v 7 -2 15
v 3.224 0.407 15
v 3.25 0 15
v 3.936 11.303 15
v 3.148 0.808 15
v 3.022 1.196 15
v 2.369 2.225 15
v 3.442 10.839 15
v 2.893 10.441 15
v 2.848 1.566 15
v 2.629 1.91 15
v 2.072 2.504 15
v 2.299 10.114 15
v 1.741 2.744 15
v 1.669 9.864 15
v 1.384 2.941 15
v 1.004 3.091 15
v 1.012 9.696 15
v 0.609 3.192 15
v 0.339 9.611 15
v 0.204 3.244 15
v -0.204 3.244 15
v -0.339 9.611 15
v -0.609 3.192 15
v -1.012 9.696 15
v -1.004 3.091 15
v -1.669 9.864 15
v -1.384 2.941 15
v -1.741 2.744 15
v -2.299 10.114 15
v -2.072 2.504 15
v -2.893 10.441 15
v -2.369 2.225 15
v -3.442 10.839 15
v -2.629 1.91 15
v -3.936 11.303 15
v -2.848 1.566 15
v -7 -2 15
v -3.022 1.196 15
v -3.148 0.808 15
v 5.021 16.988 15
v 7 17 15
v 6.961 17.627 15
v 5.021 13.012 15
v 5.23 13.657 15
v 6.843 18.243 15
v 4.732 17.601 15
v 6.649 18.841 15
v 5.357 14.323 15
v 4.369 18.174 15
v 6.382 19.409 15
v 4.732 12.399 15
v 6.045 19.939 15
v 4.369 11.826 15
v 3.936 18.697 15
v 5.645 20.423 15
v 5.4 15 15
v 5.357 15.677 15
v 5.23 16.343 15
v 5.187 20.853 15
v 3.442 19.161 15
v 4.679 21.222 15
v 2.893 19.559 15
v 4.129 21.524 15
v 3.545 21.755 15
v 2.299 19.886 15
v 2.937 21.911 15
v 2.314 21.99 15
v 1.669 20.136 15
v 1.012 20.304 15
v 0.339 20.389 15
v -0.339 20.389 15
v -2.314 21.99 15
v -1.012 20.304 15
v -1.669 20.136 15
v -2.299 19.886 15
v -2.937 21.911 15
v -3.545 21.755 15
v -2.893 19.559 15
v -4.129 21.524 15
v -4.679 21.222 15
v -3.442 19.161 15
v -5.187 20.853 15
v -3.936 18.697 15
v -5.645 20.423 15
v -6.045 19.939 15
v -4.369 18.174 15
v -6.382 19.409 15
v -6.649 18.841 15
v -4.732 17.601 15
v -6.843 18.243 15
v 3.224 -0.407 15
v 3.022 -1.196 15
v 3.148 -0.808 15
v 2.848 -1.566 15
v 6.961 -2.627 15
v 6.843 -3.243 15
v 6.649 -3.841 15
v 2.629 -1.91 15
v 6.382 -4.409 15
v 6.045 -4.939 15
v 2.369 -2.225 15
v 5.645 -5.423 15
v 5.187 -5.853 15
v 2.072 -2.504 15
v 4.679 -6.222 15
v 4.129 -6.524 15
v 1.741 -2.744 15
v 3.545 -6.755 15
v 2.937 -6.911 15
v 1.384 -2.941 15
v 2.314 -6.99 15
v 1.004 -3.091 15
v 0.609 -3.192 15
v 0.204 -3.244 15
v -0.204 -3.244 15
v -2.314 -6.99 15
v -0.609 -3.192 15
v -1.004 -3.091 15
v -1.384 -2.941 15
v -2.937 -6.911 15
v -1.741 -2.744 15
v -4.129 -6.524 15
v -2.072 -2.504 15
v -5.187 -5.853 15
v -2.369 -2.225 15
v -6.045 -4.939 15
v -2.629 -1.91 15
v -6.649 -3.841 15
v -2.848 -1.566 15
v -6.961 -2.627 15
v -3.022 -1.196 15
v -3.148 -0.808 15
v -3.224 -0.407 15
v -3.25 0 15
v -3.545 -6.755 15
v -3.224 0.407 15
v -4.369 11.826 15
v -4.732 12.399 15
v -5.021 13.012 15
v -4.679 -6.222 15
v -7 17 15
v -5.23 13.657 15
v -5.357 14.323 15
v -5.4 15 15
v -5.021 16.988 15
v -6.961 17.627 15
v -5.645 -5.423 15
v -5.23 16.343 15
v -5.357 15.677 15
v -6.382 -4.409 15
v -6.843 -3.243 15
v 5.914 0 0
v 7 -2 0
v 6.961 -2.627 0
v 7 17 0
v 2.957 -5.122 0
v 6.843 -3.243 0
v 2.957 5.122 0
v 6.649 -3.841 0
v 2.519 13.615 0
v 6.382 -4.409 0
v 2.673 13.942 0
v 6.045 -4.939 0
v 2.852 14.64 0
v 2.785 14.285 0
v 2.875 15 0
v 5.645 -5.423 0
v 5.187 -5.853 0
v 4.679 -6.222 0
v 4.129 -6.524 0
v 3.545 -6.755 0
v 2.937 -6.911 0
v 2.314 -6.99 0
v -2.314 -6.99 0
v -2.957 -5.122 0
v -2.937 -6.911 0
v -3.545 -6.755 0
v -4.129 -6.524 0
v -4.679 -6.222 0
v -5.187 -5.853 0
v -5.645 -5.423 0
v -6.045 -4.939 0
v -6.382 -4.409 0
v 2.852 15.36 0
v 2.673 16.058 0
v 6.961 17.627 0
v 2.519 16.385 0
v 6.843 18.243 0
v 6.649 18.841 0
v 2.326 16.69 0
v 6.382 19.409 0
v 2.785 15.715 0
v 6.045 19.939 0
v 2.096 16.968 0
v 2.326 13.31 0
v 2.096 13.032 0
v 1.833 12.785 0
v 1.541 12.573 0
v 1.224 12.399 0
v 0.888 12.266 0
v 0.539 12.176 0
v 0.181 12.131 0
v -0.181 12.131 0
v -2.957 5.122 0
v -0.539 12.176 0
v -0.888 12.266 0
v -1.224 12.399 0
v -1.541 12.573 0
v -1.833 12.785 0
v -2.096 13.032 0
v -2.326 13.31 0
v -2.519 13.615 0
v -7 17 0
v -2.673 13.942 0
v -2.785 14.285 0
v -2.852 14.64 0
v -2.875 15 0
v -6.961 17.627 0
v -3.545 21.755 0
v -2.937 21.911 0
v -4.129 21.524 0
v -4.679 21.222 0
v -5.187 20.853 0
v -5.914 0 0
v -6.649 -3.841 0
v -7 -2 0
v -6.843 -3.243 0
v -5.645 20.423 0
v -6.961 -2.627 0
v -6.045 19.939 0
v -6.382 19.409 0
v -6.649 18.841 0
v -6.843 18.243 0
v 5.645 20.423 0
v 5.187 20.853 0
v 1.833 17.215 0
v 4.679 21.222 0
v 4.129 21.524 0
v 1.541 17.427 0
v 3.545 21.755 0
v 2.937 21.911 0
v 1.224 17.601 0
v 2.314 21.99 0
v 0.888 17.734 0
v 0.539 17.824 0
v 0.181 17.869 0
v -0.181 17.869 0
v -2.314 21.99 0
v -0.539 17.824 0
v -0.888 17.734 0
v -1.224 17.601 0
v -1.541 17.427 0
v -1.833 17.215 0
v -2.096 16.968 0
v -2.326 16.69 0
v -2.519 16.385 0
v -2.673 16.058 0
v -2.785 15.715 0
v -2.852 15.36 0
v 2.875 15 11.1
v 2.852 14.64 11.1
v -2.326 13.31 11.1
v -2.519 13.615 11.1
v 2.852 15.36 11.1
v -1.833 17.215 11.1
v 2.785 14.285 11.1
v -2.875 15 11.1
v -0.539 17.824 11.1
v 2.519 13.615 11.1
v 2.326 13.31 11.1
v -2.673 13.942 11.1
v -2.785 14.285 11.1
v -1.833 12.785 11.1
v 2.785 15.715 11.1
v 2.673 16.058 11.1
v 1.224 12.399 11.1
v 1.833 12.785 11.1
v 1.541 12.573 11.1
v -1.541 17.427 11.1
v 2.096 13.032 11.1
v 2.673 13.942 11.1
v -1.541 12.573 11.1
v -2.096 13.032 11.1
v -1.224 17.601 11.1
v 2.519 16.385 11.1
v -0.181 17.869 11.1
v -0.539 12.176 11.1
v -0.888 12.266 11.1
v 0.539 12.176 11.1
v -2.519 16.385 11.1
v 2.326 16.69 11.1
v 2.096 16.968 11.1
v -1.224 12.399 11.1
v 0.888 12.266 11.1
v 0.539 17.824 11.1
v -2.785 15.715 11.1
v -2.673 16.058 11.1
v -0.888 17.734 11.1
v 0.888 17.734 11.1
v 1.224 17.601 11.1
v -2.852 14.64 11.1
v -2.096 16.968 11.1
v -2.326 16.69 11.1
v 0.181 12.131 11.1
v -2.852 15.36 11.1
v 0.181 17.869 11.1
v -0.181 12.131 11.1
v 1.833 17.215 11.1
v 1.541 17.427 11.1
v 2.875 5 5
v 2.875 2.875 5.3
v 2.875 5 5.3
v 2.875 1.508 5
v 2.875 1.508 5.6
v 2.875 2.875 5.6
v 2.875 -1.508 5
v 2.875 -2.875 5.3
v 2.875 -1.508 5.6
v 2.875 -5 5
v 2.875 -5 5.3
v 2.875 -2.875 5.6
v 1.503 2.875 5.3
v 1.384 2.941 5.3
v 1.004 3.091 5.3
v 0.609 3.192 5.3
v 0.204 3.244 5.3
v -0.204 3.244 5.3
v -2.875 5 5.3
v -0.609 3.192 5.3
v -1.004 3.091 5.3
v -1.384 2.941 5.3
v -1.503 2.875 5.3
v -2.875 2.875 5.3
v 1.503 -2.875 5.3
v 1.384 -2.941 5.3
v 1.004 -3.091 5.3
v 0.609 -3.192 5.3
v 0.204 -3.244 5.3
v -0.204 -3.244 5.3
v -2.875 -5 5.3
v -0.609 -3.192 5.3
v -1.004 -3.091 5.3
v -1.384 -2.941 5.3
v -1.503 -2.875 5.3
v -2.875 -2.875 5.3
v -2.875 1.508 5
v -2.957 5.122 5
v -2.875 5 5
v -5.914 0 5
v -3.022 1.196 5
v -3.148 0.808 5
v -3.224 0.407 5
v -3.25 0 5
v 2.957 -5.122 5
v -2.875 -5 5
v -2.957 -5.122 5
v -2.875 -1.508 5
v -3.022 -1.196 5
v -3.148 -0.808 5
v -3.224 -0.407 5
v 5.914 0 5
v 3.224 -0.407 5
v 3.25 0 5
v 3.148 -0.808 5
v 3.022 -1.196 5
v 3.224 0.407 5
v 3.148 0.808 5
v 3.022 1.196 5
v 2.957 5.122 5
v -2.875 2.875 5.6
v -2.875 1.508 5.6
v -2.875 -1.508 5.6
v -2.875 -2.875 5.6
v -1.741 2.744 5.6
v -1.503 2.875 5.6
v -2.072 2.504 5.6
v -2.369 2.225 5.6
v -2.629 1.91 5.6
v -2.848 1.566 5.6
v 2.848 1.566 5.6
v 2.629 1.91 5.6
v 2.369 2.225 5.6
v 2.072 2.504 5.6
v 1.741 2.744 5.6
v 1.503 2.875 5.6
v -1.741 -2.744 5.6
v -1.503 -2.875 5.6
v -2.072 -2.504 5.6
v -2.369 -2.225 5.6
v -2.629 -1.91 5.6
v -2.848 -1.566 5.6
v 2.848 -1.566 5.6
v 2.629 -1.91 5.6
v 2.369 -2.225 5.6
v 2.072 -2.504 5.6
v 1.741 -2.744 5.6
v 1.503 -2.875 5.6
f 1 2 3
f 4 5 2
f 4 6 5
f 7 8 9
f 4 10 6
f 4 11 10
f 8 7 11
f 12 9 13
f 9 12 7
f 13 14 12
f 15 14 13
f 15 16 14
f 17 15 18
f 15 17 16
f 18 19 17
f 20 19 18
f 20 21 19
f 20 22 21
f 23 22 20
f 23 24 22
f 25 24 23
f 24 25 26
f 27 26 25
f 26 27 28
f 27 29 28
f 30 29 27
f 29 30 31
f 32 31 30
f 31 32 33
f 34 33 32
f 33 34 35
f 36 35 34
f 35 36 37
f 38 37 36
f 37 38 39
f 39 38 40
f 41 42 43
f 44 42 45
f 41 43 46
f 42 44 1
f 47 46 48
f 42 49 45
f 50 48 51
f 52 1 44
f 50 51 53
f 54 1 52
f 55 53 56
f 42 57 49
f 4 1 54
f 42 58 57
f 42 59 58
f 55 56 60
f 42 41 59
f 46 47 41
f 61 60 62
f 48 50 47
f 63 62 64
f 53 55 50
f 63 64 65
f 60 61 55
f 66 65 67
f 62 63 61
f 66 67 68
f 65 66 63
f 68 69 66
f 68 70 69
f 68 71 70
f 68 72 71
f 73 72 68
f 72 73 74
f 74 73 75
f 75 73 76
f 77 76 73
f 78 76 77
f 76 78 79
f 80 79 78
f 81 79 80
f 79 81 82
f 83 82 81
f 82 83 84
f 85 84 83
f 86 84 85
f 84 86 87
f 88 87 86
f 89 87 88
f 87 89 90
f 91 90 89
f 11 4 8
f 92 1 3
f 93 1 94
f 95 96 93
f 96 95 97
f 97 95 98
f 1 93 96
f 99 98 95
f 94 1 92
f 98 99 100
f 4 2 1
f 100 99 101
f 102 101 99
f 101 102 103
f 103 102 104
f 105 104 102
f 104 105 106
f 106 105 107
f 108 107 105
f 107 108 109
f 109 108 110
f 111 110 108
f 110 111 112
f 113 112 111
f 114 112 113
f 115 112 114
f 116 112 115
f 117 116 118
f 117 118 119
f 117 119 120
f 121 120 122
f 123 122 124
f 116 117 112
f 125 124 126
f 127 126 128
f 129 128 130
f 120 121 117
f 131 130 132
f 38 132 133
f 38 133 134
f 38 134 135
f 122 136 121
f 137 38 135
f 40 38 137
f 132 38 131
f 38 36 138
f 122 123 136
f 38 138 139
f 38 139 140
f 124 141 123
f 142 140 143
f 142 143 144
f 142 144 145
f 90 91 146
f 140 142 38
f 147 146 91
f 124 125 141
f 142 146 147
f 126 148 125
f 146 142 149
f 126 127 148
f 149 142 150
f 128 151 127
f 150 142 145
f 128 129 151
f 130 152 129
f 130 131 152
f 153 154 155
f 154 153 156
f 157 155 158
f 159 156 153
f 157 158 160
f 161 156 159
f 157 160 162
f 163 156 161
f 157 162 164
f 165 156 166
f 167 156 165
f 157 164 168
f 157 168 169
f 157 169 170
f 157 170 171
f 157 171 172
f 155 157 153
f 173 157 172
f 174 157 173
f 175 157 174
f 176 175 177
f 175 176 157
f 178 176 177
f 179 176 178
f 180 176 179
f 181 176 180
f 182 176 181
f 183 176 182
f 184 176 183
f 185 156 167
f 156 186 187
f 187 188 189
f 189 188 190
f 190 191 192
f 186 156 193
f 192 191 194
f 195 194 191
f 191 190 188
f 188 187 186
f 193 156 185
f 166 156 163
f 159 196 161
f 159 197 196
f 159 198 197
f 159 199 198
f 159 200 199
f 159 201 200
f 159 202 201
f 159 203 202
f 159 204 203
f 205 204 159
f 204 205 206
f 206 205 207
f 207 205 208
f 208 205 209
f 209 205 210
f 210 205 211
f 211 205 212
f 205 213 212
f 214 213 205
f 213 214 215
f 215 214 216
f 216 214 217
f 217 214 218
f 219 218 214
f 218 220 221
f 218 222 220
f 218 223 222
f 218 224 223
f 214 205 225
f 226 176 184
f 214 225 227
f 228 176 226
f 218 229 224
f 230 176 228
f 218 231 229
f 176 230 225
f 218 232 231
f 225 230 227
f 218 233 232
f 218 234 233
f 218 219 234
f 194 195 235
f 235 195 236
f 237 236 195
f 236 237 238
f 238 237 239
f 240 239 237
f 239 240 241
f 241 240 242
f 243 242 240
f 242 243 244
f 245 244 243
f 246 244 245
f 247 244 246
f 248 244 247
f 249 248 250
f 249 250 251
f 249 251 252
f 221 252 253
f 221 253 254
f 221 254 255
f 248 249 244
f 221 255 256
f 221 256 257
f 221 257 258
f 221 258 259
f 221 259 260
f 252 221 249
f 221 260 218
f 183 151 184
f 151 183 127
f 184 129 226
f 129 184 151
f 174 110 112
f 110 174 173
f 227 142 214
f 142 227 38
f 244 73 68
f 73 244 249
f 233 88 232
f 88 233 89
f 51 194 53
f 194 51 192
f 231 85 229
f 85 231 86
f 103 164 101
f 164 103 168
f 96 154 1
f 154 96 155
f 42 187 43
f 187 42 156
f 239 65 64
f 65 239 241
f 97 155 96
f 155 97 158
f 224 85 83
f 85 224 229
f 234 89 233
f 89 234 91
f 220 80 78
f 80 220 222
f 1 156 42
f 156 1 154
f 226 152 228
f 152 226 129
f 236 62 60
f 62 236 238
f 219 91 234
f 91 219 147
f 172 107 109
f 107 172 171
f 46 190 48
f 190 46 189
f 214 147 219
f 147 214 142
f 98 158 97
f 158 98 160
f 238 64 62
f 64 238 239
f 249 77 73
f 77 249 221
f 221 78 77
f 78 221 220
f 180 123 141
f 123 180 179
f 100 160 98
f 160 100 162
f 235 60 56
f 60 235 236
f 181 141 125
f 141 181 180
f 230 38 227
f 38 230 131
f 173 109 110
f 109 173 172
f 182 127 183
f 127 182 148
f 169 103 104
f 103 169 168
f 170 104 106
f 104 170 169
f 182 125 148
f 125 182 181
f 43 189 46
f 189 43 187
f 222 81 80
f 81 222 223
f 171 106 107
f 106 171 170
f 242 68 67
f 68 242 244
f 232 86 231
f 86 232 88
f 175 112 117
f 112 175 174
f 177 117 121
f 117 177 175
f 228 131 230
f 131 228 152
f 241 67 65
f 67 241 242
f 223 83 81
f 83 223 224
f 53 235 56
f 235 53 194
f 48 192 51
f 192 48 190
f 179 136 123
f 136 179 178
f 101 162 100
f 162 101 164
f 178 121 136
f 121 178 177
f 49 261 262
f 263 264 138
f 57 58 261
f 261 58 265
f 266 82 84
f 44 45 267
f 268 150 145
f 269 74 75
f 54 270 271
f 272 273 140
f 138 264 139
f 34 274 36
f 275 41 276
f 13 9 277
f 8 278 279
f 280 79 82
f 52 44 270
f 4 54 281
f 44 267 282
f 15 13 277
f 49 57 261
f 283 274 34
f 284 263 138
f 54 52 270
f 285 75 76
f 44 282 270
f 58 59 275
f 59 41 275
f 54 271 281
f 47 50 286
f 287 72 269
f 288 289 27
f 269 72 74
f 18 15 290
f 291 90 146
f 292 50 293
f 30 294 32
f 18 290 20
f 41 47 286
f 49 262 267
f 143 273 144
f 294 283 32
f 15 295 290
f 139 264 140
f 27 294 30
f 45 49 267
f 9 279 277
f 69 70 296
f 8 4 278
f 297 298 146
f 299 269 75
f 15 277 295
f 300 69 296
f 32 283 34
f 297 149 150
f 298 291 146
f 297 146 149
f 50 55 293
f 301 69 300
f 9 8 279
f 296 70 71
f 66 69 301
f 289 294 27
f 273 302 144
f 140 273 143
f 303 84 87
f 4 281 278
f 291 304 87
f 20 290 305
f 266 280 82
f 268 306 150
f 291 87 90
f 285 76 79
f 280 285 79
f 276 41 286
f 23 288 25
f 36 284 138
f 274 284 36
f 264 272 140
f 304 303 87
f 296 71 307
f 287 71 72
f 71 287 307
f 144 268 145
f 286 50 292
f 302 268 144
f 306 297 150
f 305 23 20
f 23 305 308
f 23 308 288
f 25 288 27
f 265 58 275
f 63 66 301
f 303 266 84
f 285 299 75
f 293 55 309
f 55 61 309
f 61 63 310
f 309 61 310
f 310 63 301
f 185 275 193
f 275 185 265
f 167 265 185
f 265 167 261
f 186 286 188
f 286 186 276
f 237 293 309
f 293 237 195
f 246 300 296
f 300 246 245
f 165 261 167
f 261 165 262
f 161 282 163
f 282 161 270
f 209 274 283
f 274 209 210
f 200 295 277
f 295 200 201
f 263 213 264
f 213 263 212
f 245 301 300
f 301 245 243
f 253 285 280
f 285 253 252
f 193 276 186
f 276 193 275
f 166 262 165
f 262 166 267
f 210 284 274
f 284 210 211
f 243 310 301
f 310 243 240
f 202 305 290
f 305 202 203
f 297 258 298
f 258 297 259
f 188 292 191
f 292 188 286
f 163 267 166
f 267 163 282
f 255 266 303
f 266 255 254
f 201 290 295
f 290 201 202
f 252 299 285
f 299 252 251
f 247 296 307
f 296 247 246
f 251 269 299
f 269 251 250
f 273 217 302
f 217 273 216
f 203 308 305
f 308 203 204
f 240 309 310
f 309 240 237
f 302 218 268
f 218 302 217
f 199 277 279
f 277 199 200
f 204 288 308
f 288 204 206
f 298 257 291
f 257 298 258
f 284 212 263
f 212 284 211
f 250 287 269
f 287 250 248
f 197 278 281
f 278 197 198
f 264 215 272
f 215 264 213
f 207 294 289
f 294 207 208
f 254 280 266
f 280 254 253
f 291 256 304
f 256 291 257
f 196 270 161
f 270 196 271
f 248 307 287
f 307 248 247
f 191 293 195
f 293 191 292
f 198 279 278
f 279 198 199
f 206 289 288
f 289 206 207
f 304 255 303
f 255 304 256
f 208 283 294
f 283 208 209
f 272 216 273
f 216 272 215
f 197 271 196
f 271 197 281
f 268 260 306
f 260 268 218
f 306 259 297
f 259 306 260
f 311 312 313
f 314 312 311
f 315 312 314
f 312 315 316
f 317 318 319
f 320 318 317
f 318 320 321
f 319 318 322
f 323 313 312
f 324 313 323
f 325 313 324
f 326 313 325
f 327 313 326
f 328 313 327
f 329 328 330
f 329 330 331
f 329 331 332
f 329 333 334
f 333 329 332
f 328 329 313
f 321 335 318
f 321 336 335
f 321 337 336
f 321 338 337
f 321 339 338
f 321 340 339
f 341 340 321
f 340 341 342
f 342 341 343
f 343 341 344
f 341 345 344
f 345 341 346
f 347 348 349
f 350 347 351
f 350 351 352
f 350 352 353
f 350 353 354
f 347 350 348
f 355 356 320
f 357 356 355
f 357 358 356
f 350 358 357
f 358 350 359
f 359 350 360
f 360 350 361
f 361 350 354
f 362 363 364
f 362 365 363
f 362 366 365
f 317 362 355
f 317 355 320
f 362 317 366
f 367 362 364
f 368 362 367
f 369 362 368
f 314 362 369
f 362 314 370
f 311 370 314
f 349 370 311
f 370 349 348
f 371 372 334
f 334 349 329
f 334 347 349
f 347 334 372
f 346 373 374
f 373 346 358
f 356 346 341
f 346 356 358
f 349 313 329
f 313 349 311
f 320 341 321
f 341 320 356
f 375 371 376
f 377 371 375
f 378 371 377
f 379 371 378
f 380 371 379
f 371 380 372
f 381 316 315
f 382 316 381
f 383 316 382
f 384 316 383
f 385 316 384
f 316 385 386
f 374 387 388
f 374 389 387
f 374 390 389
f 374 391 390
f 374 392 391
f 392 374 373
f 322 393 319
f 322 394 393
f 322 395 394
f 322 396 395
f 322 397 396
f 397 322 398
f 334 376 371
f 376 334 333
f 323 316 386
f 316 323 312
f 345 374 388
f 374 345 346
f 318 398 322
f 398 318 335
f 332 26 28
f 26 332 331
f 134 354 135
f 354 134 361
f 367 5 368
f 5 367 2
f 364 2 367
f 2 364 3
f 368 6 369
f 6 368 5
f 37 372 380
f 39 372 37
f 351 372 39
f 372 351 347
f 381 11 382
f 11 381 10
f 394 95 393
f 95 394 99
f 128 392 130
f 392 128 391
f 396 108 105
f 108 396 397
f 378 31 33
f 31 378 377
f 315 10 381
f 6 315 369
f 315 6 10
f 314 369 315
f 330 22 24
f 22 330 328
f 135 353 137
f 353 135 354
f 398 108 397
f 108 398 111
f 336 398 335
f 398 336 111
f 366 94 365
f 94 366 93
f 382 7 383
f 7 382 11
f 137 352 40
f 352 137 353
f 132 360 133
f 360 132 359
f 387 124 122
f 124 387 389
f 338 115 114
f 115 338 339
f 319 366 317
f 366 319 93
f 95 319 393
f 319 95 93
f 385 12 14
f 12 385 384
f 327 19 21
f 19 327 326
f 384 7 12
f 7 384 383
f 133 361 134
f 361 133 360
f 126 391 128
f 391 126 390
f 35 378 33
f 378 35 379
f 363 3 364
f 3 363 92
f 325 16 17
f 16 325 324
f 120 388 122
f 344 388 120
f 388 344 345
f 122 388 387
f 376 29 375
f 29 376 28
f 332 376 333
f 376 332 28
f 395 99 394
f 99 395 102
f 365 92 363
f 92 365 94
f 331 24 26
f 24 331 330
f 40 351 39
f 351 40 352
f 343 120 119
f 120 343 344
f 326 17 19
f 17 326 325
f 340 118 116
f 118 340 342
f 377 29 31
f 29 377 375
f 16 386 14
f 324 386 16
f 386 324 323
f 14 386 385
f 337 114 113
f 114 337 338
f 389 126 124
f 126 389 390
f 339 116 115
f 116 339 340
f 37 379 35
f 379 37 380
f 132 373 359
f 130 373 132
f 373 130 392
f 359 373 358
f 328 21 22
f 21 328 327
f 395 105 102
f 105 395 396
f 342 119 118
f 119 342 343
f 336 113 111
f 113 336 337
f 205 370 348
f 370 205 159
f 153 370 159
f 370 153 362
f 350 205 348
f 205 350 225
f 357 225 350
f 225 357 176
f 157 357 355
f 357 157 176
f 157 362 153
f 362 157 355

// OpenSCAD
$fn = 50;


difference() {
	union() {
		cylinder(h = 15, r = 7.0000000000);
		translate(v = [0.0000000000, 7.5000000000, 0]) {
			hull() {
				translate(v = [-2.0000000000, 9.5000000000, 0]) {
					cylinder(h = 15, r = 5);
				}
				translate(v = [2.0000000000, 9.5000000000, 0]) {
					cylinder(h = 15, r = 5);
				}
				translate(v = [-2.0000000000, -9.5000000000, 0]) {
					cylinder(h = 15, r = 5);
				}
				translate(v = [2.0000000000, -9.5000000000, 0]) {
					cylinder(h = 15, r = 5);
				}
			}
		}
		translate(v = [0.0000000000, 7.5000000000, 0]) {
			hull() {
				translate(v = [-2.0000000000, 9.5000000000, 0]) {
					cylinder(h = 15, r = 5);
				}
				translate(v = [2.0000000000, 9.5000000000, 0]) {
					cylinder(h = 15, r = 5);
				}
				translate(v = [-2.0000000000, -9.5000000000, 0]) {
					cylinder(h = 15, r = 5);
				}
				translate(v = [2.0000000000, -9.5000000000, 0]) {
					cylinder(h = 15, r = 5);
				}
			}
		}
	}
	union() {
		translate(v = [0.0000000000, 15.0000000000, 15]) {
			rotate(a = [0, 0, 0]) {
				difference() {
					union() {
						#translate(v = [0, 0, -15.0000000000]) {
							cylinder(h = 15, r = 2.6000000000);
						}
						#translate(v = [0, 0, -3.9000000000]) {
							cylinder(h = 3.9000000000, r1 = 2.8750000000, r2 = 5.4000000000);
						}
						#translate(v = [0, 0, -15.0000000000]) {
							cylinder(h = 15, r = 2.8750000000);
						}
						#translate(v = [0, 0, -15.0000000000]) {
							cylinder(h = 15, r = 2.6000000000);
						}
					}
					union();
				}
			}
		}
		translate(v = [0.0000000000, 15.0000000000, 15]) {
			rotate(a = [0, 0, 0]) {
				difference() {
					union() {
						#translate(v = [0, 0, -15.0000000000]) {
							cylinder(h = 15, r = 2.6000000000);
						}
						#translate(v = [0, 0, -3.9000000000]) {
							cylinder(h = 3.9000000000, r1 = 2.8750000000, r2 = 5.4000000000);
						}
						#translate(v = [0, 0, -15.0000000000]) {
							cylinder(h = 15, r = 2.8750000000);
						}
						#translate(v = [0, 0, -15.0000000000]) {
							cylinder(h = 15, r = 2.6000000000);
						}
					}
					union();
				}
			}
		}
		translate(v = [0.0000000000, 0.0000000000, 0]) {
			rotate(a = [0, 0, 0]) {
				difference() {
					union() {
						#translate(v = [-2.8750000000, -5.0000000000, -0.3000000000]) {
							cube(size = [5.7500000000, 10, 0.3000000000]);
						}
						#translate(v = [-2.8750000000, -2.8750000000, -0.6000000000]) {
							cube(size = [5.7500000000, 5.7500000000, 0.3000000000]);
						}
						#translate(v = [-2.8750000000, -5.0000000000, 5]) {
							cube(size = [5.7500000000, 10, 0.3000000000]);
						}
						#translate(v = [-2.8750000000, -2.8750000000, 5.3000000000]) {
							cube(size = [5.7500000000, 5.7500000000, 0.3000000000]);
						}
						#translate(v = [0, 0, -100.0000000000]) {
							cylinder(h = 200, r = 3.2500000000);
						}
						#linear_extrude(height = 5) {
							polygon(points = [[5.9142500000, 0.0000000000], [2.9571250000, 5.1218907443], [-2.9571250000, 5.1218907443], [-5.9142500000, 0.0000000000], [-2.9571250000, -5.1218907443], [2.9571250000, -5.1218907443]]);
						}
						#translate(v = [-2.8750000000, -5.0000000000, -0.3000000000]) {
							cube(size = [5.7500000000, 10, 0.3000000000]);
						}
						#translate(v = [-2.8750000000, -2.8750000000, -0.6000000000]) {
							cube(size = [5.7500000000, 5.7500000000, 0.3000000000]);
						}
						#translate(v = [-2.8750000000, -5.0000000000, 5]) {
							cube(size = [5.7500000000, 10, 0.3000000000]);
						}
						#translate(v = [-2.8750000000, -2.8750000000, 5.3000000000]) {
							cube(size = [5.7500000000, 5.7500000000, 0.3000000000]);
						}
						#translate(v = [0, 0, -100.0000000000]) {
							cylinder(h = 200, r = 3.2500000000);
						}
						#translate(v = [-2.8750000000, -5.0000000000, -0.3000000000]) {
							cube(size = [5.7500000000, 10, 0.3000000000]);
						}
						#translate(v = [-2.8750000000, -2.8750000000, -0.6000000000]) {
							cube(size = [5.7500000000, 5.7500000000, 0.3000000000]);
						}
						#translate(v = [-2.8750000000, -5.0000000000, 5]) {
							cube(size = [5.7500000000, 10, 0.3000000000]);
						}
						#translate(v = [-2.8750000000, -2.8750000000, 5.3000000000]) {
							cube(size = [5.7500000000, 5.7500000000, 0.3000000000]);
						}
						#translate(v = [0, 0, -100.0000000000]) {
							cylinder(h = 200, r = 3.2500000000);
						}
					}
					union();
				}
			}
		}
		translate(v = [0, 0, -100]) {
			cylinder(h = 200, r = 3.2500000000);
		}
		translate(v = [0, 0, -100]) {
			cylinder(h = 200, r = 1.8000000000);
		}
	}
}
